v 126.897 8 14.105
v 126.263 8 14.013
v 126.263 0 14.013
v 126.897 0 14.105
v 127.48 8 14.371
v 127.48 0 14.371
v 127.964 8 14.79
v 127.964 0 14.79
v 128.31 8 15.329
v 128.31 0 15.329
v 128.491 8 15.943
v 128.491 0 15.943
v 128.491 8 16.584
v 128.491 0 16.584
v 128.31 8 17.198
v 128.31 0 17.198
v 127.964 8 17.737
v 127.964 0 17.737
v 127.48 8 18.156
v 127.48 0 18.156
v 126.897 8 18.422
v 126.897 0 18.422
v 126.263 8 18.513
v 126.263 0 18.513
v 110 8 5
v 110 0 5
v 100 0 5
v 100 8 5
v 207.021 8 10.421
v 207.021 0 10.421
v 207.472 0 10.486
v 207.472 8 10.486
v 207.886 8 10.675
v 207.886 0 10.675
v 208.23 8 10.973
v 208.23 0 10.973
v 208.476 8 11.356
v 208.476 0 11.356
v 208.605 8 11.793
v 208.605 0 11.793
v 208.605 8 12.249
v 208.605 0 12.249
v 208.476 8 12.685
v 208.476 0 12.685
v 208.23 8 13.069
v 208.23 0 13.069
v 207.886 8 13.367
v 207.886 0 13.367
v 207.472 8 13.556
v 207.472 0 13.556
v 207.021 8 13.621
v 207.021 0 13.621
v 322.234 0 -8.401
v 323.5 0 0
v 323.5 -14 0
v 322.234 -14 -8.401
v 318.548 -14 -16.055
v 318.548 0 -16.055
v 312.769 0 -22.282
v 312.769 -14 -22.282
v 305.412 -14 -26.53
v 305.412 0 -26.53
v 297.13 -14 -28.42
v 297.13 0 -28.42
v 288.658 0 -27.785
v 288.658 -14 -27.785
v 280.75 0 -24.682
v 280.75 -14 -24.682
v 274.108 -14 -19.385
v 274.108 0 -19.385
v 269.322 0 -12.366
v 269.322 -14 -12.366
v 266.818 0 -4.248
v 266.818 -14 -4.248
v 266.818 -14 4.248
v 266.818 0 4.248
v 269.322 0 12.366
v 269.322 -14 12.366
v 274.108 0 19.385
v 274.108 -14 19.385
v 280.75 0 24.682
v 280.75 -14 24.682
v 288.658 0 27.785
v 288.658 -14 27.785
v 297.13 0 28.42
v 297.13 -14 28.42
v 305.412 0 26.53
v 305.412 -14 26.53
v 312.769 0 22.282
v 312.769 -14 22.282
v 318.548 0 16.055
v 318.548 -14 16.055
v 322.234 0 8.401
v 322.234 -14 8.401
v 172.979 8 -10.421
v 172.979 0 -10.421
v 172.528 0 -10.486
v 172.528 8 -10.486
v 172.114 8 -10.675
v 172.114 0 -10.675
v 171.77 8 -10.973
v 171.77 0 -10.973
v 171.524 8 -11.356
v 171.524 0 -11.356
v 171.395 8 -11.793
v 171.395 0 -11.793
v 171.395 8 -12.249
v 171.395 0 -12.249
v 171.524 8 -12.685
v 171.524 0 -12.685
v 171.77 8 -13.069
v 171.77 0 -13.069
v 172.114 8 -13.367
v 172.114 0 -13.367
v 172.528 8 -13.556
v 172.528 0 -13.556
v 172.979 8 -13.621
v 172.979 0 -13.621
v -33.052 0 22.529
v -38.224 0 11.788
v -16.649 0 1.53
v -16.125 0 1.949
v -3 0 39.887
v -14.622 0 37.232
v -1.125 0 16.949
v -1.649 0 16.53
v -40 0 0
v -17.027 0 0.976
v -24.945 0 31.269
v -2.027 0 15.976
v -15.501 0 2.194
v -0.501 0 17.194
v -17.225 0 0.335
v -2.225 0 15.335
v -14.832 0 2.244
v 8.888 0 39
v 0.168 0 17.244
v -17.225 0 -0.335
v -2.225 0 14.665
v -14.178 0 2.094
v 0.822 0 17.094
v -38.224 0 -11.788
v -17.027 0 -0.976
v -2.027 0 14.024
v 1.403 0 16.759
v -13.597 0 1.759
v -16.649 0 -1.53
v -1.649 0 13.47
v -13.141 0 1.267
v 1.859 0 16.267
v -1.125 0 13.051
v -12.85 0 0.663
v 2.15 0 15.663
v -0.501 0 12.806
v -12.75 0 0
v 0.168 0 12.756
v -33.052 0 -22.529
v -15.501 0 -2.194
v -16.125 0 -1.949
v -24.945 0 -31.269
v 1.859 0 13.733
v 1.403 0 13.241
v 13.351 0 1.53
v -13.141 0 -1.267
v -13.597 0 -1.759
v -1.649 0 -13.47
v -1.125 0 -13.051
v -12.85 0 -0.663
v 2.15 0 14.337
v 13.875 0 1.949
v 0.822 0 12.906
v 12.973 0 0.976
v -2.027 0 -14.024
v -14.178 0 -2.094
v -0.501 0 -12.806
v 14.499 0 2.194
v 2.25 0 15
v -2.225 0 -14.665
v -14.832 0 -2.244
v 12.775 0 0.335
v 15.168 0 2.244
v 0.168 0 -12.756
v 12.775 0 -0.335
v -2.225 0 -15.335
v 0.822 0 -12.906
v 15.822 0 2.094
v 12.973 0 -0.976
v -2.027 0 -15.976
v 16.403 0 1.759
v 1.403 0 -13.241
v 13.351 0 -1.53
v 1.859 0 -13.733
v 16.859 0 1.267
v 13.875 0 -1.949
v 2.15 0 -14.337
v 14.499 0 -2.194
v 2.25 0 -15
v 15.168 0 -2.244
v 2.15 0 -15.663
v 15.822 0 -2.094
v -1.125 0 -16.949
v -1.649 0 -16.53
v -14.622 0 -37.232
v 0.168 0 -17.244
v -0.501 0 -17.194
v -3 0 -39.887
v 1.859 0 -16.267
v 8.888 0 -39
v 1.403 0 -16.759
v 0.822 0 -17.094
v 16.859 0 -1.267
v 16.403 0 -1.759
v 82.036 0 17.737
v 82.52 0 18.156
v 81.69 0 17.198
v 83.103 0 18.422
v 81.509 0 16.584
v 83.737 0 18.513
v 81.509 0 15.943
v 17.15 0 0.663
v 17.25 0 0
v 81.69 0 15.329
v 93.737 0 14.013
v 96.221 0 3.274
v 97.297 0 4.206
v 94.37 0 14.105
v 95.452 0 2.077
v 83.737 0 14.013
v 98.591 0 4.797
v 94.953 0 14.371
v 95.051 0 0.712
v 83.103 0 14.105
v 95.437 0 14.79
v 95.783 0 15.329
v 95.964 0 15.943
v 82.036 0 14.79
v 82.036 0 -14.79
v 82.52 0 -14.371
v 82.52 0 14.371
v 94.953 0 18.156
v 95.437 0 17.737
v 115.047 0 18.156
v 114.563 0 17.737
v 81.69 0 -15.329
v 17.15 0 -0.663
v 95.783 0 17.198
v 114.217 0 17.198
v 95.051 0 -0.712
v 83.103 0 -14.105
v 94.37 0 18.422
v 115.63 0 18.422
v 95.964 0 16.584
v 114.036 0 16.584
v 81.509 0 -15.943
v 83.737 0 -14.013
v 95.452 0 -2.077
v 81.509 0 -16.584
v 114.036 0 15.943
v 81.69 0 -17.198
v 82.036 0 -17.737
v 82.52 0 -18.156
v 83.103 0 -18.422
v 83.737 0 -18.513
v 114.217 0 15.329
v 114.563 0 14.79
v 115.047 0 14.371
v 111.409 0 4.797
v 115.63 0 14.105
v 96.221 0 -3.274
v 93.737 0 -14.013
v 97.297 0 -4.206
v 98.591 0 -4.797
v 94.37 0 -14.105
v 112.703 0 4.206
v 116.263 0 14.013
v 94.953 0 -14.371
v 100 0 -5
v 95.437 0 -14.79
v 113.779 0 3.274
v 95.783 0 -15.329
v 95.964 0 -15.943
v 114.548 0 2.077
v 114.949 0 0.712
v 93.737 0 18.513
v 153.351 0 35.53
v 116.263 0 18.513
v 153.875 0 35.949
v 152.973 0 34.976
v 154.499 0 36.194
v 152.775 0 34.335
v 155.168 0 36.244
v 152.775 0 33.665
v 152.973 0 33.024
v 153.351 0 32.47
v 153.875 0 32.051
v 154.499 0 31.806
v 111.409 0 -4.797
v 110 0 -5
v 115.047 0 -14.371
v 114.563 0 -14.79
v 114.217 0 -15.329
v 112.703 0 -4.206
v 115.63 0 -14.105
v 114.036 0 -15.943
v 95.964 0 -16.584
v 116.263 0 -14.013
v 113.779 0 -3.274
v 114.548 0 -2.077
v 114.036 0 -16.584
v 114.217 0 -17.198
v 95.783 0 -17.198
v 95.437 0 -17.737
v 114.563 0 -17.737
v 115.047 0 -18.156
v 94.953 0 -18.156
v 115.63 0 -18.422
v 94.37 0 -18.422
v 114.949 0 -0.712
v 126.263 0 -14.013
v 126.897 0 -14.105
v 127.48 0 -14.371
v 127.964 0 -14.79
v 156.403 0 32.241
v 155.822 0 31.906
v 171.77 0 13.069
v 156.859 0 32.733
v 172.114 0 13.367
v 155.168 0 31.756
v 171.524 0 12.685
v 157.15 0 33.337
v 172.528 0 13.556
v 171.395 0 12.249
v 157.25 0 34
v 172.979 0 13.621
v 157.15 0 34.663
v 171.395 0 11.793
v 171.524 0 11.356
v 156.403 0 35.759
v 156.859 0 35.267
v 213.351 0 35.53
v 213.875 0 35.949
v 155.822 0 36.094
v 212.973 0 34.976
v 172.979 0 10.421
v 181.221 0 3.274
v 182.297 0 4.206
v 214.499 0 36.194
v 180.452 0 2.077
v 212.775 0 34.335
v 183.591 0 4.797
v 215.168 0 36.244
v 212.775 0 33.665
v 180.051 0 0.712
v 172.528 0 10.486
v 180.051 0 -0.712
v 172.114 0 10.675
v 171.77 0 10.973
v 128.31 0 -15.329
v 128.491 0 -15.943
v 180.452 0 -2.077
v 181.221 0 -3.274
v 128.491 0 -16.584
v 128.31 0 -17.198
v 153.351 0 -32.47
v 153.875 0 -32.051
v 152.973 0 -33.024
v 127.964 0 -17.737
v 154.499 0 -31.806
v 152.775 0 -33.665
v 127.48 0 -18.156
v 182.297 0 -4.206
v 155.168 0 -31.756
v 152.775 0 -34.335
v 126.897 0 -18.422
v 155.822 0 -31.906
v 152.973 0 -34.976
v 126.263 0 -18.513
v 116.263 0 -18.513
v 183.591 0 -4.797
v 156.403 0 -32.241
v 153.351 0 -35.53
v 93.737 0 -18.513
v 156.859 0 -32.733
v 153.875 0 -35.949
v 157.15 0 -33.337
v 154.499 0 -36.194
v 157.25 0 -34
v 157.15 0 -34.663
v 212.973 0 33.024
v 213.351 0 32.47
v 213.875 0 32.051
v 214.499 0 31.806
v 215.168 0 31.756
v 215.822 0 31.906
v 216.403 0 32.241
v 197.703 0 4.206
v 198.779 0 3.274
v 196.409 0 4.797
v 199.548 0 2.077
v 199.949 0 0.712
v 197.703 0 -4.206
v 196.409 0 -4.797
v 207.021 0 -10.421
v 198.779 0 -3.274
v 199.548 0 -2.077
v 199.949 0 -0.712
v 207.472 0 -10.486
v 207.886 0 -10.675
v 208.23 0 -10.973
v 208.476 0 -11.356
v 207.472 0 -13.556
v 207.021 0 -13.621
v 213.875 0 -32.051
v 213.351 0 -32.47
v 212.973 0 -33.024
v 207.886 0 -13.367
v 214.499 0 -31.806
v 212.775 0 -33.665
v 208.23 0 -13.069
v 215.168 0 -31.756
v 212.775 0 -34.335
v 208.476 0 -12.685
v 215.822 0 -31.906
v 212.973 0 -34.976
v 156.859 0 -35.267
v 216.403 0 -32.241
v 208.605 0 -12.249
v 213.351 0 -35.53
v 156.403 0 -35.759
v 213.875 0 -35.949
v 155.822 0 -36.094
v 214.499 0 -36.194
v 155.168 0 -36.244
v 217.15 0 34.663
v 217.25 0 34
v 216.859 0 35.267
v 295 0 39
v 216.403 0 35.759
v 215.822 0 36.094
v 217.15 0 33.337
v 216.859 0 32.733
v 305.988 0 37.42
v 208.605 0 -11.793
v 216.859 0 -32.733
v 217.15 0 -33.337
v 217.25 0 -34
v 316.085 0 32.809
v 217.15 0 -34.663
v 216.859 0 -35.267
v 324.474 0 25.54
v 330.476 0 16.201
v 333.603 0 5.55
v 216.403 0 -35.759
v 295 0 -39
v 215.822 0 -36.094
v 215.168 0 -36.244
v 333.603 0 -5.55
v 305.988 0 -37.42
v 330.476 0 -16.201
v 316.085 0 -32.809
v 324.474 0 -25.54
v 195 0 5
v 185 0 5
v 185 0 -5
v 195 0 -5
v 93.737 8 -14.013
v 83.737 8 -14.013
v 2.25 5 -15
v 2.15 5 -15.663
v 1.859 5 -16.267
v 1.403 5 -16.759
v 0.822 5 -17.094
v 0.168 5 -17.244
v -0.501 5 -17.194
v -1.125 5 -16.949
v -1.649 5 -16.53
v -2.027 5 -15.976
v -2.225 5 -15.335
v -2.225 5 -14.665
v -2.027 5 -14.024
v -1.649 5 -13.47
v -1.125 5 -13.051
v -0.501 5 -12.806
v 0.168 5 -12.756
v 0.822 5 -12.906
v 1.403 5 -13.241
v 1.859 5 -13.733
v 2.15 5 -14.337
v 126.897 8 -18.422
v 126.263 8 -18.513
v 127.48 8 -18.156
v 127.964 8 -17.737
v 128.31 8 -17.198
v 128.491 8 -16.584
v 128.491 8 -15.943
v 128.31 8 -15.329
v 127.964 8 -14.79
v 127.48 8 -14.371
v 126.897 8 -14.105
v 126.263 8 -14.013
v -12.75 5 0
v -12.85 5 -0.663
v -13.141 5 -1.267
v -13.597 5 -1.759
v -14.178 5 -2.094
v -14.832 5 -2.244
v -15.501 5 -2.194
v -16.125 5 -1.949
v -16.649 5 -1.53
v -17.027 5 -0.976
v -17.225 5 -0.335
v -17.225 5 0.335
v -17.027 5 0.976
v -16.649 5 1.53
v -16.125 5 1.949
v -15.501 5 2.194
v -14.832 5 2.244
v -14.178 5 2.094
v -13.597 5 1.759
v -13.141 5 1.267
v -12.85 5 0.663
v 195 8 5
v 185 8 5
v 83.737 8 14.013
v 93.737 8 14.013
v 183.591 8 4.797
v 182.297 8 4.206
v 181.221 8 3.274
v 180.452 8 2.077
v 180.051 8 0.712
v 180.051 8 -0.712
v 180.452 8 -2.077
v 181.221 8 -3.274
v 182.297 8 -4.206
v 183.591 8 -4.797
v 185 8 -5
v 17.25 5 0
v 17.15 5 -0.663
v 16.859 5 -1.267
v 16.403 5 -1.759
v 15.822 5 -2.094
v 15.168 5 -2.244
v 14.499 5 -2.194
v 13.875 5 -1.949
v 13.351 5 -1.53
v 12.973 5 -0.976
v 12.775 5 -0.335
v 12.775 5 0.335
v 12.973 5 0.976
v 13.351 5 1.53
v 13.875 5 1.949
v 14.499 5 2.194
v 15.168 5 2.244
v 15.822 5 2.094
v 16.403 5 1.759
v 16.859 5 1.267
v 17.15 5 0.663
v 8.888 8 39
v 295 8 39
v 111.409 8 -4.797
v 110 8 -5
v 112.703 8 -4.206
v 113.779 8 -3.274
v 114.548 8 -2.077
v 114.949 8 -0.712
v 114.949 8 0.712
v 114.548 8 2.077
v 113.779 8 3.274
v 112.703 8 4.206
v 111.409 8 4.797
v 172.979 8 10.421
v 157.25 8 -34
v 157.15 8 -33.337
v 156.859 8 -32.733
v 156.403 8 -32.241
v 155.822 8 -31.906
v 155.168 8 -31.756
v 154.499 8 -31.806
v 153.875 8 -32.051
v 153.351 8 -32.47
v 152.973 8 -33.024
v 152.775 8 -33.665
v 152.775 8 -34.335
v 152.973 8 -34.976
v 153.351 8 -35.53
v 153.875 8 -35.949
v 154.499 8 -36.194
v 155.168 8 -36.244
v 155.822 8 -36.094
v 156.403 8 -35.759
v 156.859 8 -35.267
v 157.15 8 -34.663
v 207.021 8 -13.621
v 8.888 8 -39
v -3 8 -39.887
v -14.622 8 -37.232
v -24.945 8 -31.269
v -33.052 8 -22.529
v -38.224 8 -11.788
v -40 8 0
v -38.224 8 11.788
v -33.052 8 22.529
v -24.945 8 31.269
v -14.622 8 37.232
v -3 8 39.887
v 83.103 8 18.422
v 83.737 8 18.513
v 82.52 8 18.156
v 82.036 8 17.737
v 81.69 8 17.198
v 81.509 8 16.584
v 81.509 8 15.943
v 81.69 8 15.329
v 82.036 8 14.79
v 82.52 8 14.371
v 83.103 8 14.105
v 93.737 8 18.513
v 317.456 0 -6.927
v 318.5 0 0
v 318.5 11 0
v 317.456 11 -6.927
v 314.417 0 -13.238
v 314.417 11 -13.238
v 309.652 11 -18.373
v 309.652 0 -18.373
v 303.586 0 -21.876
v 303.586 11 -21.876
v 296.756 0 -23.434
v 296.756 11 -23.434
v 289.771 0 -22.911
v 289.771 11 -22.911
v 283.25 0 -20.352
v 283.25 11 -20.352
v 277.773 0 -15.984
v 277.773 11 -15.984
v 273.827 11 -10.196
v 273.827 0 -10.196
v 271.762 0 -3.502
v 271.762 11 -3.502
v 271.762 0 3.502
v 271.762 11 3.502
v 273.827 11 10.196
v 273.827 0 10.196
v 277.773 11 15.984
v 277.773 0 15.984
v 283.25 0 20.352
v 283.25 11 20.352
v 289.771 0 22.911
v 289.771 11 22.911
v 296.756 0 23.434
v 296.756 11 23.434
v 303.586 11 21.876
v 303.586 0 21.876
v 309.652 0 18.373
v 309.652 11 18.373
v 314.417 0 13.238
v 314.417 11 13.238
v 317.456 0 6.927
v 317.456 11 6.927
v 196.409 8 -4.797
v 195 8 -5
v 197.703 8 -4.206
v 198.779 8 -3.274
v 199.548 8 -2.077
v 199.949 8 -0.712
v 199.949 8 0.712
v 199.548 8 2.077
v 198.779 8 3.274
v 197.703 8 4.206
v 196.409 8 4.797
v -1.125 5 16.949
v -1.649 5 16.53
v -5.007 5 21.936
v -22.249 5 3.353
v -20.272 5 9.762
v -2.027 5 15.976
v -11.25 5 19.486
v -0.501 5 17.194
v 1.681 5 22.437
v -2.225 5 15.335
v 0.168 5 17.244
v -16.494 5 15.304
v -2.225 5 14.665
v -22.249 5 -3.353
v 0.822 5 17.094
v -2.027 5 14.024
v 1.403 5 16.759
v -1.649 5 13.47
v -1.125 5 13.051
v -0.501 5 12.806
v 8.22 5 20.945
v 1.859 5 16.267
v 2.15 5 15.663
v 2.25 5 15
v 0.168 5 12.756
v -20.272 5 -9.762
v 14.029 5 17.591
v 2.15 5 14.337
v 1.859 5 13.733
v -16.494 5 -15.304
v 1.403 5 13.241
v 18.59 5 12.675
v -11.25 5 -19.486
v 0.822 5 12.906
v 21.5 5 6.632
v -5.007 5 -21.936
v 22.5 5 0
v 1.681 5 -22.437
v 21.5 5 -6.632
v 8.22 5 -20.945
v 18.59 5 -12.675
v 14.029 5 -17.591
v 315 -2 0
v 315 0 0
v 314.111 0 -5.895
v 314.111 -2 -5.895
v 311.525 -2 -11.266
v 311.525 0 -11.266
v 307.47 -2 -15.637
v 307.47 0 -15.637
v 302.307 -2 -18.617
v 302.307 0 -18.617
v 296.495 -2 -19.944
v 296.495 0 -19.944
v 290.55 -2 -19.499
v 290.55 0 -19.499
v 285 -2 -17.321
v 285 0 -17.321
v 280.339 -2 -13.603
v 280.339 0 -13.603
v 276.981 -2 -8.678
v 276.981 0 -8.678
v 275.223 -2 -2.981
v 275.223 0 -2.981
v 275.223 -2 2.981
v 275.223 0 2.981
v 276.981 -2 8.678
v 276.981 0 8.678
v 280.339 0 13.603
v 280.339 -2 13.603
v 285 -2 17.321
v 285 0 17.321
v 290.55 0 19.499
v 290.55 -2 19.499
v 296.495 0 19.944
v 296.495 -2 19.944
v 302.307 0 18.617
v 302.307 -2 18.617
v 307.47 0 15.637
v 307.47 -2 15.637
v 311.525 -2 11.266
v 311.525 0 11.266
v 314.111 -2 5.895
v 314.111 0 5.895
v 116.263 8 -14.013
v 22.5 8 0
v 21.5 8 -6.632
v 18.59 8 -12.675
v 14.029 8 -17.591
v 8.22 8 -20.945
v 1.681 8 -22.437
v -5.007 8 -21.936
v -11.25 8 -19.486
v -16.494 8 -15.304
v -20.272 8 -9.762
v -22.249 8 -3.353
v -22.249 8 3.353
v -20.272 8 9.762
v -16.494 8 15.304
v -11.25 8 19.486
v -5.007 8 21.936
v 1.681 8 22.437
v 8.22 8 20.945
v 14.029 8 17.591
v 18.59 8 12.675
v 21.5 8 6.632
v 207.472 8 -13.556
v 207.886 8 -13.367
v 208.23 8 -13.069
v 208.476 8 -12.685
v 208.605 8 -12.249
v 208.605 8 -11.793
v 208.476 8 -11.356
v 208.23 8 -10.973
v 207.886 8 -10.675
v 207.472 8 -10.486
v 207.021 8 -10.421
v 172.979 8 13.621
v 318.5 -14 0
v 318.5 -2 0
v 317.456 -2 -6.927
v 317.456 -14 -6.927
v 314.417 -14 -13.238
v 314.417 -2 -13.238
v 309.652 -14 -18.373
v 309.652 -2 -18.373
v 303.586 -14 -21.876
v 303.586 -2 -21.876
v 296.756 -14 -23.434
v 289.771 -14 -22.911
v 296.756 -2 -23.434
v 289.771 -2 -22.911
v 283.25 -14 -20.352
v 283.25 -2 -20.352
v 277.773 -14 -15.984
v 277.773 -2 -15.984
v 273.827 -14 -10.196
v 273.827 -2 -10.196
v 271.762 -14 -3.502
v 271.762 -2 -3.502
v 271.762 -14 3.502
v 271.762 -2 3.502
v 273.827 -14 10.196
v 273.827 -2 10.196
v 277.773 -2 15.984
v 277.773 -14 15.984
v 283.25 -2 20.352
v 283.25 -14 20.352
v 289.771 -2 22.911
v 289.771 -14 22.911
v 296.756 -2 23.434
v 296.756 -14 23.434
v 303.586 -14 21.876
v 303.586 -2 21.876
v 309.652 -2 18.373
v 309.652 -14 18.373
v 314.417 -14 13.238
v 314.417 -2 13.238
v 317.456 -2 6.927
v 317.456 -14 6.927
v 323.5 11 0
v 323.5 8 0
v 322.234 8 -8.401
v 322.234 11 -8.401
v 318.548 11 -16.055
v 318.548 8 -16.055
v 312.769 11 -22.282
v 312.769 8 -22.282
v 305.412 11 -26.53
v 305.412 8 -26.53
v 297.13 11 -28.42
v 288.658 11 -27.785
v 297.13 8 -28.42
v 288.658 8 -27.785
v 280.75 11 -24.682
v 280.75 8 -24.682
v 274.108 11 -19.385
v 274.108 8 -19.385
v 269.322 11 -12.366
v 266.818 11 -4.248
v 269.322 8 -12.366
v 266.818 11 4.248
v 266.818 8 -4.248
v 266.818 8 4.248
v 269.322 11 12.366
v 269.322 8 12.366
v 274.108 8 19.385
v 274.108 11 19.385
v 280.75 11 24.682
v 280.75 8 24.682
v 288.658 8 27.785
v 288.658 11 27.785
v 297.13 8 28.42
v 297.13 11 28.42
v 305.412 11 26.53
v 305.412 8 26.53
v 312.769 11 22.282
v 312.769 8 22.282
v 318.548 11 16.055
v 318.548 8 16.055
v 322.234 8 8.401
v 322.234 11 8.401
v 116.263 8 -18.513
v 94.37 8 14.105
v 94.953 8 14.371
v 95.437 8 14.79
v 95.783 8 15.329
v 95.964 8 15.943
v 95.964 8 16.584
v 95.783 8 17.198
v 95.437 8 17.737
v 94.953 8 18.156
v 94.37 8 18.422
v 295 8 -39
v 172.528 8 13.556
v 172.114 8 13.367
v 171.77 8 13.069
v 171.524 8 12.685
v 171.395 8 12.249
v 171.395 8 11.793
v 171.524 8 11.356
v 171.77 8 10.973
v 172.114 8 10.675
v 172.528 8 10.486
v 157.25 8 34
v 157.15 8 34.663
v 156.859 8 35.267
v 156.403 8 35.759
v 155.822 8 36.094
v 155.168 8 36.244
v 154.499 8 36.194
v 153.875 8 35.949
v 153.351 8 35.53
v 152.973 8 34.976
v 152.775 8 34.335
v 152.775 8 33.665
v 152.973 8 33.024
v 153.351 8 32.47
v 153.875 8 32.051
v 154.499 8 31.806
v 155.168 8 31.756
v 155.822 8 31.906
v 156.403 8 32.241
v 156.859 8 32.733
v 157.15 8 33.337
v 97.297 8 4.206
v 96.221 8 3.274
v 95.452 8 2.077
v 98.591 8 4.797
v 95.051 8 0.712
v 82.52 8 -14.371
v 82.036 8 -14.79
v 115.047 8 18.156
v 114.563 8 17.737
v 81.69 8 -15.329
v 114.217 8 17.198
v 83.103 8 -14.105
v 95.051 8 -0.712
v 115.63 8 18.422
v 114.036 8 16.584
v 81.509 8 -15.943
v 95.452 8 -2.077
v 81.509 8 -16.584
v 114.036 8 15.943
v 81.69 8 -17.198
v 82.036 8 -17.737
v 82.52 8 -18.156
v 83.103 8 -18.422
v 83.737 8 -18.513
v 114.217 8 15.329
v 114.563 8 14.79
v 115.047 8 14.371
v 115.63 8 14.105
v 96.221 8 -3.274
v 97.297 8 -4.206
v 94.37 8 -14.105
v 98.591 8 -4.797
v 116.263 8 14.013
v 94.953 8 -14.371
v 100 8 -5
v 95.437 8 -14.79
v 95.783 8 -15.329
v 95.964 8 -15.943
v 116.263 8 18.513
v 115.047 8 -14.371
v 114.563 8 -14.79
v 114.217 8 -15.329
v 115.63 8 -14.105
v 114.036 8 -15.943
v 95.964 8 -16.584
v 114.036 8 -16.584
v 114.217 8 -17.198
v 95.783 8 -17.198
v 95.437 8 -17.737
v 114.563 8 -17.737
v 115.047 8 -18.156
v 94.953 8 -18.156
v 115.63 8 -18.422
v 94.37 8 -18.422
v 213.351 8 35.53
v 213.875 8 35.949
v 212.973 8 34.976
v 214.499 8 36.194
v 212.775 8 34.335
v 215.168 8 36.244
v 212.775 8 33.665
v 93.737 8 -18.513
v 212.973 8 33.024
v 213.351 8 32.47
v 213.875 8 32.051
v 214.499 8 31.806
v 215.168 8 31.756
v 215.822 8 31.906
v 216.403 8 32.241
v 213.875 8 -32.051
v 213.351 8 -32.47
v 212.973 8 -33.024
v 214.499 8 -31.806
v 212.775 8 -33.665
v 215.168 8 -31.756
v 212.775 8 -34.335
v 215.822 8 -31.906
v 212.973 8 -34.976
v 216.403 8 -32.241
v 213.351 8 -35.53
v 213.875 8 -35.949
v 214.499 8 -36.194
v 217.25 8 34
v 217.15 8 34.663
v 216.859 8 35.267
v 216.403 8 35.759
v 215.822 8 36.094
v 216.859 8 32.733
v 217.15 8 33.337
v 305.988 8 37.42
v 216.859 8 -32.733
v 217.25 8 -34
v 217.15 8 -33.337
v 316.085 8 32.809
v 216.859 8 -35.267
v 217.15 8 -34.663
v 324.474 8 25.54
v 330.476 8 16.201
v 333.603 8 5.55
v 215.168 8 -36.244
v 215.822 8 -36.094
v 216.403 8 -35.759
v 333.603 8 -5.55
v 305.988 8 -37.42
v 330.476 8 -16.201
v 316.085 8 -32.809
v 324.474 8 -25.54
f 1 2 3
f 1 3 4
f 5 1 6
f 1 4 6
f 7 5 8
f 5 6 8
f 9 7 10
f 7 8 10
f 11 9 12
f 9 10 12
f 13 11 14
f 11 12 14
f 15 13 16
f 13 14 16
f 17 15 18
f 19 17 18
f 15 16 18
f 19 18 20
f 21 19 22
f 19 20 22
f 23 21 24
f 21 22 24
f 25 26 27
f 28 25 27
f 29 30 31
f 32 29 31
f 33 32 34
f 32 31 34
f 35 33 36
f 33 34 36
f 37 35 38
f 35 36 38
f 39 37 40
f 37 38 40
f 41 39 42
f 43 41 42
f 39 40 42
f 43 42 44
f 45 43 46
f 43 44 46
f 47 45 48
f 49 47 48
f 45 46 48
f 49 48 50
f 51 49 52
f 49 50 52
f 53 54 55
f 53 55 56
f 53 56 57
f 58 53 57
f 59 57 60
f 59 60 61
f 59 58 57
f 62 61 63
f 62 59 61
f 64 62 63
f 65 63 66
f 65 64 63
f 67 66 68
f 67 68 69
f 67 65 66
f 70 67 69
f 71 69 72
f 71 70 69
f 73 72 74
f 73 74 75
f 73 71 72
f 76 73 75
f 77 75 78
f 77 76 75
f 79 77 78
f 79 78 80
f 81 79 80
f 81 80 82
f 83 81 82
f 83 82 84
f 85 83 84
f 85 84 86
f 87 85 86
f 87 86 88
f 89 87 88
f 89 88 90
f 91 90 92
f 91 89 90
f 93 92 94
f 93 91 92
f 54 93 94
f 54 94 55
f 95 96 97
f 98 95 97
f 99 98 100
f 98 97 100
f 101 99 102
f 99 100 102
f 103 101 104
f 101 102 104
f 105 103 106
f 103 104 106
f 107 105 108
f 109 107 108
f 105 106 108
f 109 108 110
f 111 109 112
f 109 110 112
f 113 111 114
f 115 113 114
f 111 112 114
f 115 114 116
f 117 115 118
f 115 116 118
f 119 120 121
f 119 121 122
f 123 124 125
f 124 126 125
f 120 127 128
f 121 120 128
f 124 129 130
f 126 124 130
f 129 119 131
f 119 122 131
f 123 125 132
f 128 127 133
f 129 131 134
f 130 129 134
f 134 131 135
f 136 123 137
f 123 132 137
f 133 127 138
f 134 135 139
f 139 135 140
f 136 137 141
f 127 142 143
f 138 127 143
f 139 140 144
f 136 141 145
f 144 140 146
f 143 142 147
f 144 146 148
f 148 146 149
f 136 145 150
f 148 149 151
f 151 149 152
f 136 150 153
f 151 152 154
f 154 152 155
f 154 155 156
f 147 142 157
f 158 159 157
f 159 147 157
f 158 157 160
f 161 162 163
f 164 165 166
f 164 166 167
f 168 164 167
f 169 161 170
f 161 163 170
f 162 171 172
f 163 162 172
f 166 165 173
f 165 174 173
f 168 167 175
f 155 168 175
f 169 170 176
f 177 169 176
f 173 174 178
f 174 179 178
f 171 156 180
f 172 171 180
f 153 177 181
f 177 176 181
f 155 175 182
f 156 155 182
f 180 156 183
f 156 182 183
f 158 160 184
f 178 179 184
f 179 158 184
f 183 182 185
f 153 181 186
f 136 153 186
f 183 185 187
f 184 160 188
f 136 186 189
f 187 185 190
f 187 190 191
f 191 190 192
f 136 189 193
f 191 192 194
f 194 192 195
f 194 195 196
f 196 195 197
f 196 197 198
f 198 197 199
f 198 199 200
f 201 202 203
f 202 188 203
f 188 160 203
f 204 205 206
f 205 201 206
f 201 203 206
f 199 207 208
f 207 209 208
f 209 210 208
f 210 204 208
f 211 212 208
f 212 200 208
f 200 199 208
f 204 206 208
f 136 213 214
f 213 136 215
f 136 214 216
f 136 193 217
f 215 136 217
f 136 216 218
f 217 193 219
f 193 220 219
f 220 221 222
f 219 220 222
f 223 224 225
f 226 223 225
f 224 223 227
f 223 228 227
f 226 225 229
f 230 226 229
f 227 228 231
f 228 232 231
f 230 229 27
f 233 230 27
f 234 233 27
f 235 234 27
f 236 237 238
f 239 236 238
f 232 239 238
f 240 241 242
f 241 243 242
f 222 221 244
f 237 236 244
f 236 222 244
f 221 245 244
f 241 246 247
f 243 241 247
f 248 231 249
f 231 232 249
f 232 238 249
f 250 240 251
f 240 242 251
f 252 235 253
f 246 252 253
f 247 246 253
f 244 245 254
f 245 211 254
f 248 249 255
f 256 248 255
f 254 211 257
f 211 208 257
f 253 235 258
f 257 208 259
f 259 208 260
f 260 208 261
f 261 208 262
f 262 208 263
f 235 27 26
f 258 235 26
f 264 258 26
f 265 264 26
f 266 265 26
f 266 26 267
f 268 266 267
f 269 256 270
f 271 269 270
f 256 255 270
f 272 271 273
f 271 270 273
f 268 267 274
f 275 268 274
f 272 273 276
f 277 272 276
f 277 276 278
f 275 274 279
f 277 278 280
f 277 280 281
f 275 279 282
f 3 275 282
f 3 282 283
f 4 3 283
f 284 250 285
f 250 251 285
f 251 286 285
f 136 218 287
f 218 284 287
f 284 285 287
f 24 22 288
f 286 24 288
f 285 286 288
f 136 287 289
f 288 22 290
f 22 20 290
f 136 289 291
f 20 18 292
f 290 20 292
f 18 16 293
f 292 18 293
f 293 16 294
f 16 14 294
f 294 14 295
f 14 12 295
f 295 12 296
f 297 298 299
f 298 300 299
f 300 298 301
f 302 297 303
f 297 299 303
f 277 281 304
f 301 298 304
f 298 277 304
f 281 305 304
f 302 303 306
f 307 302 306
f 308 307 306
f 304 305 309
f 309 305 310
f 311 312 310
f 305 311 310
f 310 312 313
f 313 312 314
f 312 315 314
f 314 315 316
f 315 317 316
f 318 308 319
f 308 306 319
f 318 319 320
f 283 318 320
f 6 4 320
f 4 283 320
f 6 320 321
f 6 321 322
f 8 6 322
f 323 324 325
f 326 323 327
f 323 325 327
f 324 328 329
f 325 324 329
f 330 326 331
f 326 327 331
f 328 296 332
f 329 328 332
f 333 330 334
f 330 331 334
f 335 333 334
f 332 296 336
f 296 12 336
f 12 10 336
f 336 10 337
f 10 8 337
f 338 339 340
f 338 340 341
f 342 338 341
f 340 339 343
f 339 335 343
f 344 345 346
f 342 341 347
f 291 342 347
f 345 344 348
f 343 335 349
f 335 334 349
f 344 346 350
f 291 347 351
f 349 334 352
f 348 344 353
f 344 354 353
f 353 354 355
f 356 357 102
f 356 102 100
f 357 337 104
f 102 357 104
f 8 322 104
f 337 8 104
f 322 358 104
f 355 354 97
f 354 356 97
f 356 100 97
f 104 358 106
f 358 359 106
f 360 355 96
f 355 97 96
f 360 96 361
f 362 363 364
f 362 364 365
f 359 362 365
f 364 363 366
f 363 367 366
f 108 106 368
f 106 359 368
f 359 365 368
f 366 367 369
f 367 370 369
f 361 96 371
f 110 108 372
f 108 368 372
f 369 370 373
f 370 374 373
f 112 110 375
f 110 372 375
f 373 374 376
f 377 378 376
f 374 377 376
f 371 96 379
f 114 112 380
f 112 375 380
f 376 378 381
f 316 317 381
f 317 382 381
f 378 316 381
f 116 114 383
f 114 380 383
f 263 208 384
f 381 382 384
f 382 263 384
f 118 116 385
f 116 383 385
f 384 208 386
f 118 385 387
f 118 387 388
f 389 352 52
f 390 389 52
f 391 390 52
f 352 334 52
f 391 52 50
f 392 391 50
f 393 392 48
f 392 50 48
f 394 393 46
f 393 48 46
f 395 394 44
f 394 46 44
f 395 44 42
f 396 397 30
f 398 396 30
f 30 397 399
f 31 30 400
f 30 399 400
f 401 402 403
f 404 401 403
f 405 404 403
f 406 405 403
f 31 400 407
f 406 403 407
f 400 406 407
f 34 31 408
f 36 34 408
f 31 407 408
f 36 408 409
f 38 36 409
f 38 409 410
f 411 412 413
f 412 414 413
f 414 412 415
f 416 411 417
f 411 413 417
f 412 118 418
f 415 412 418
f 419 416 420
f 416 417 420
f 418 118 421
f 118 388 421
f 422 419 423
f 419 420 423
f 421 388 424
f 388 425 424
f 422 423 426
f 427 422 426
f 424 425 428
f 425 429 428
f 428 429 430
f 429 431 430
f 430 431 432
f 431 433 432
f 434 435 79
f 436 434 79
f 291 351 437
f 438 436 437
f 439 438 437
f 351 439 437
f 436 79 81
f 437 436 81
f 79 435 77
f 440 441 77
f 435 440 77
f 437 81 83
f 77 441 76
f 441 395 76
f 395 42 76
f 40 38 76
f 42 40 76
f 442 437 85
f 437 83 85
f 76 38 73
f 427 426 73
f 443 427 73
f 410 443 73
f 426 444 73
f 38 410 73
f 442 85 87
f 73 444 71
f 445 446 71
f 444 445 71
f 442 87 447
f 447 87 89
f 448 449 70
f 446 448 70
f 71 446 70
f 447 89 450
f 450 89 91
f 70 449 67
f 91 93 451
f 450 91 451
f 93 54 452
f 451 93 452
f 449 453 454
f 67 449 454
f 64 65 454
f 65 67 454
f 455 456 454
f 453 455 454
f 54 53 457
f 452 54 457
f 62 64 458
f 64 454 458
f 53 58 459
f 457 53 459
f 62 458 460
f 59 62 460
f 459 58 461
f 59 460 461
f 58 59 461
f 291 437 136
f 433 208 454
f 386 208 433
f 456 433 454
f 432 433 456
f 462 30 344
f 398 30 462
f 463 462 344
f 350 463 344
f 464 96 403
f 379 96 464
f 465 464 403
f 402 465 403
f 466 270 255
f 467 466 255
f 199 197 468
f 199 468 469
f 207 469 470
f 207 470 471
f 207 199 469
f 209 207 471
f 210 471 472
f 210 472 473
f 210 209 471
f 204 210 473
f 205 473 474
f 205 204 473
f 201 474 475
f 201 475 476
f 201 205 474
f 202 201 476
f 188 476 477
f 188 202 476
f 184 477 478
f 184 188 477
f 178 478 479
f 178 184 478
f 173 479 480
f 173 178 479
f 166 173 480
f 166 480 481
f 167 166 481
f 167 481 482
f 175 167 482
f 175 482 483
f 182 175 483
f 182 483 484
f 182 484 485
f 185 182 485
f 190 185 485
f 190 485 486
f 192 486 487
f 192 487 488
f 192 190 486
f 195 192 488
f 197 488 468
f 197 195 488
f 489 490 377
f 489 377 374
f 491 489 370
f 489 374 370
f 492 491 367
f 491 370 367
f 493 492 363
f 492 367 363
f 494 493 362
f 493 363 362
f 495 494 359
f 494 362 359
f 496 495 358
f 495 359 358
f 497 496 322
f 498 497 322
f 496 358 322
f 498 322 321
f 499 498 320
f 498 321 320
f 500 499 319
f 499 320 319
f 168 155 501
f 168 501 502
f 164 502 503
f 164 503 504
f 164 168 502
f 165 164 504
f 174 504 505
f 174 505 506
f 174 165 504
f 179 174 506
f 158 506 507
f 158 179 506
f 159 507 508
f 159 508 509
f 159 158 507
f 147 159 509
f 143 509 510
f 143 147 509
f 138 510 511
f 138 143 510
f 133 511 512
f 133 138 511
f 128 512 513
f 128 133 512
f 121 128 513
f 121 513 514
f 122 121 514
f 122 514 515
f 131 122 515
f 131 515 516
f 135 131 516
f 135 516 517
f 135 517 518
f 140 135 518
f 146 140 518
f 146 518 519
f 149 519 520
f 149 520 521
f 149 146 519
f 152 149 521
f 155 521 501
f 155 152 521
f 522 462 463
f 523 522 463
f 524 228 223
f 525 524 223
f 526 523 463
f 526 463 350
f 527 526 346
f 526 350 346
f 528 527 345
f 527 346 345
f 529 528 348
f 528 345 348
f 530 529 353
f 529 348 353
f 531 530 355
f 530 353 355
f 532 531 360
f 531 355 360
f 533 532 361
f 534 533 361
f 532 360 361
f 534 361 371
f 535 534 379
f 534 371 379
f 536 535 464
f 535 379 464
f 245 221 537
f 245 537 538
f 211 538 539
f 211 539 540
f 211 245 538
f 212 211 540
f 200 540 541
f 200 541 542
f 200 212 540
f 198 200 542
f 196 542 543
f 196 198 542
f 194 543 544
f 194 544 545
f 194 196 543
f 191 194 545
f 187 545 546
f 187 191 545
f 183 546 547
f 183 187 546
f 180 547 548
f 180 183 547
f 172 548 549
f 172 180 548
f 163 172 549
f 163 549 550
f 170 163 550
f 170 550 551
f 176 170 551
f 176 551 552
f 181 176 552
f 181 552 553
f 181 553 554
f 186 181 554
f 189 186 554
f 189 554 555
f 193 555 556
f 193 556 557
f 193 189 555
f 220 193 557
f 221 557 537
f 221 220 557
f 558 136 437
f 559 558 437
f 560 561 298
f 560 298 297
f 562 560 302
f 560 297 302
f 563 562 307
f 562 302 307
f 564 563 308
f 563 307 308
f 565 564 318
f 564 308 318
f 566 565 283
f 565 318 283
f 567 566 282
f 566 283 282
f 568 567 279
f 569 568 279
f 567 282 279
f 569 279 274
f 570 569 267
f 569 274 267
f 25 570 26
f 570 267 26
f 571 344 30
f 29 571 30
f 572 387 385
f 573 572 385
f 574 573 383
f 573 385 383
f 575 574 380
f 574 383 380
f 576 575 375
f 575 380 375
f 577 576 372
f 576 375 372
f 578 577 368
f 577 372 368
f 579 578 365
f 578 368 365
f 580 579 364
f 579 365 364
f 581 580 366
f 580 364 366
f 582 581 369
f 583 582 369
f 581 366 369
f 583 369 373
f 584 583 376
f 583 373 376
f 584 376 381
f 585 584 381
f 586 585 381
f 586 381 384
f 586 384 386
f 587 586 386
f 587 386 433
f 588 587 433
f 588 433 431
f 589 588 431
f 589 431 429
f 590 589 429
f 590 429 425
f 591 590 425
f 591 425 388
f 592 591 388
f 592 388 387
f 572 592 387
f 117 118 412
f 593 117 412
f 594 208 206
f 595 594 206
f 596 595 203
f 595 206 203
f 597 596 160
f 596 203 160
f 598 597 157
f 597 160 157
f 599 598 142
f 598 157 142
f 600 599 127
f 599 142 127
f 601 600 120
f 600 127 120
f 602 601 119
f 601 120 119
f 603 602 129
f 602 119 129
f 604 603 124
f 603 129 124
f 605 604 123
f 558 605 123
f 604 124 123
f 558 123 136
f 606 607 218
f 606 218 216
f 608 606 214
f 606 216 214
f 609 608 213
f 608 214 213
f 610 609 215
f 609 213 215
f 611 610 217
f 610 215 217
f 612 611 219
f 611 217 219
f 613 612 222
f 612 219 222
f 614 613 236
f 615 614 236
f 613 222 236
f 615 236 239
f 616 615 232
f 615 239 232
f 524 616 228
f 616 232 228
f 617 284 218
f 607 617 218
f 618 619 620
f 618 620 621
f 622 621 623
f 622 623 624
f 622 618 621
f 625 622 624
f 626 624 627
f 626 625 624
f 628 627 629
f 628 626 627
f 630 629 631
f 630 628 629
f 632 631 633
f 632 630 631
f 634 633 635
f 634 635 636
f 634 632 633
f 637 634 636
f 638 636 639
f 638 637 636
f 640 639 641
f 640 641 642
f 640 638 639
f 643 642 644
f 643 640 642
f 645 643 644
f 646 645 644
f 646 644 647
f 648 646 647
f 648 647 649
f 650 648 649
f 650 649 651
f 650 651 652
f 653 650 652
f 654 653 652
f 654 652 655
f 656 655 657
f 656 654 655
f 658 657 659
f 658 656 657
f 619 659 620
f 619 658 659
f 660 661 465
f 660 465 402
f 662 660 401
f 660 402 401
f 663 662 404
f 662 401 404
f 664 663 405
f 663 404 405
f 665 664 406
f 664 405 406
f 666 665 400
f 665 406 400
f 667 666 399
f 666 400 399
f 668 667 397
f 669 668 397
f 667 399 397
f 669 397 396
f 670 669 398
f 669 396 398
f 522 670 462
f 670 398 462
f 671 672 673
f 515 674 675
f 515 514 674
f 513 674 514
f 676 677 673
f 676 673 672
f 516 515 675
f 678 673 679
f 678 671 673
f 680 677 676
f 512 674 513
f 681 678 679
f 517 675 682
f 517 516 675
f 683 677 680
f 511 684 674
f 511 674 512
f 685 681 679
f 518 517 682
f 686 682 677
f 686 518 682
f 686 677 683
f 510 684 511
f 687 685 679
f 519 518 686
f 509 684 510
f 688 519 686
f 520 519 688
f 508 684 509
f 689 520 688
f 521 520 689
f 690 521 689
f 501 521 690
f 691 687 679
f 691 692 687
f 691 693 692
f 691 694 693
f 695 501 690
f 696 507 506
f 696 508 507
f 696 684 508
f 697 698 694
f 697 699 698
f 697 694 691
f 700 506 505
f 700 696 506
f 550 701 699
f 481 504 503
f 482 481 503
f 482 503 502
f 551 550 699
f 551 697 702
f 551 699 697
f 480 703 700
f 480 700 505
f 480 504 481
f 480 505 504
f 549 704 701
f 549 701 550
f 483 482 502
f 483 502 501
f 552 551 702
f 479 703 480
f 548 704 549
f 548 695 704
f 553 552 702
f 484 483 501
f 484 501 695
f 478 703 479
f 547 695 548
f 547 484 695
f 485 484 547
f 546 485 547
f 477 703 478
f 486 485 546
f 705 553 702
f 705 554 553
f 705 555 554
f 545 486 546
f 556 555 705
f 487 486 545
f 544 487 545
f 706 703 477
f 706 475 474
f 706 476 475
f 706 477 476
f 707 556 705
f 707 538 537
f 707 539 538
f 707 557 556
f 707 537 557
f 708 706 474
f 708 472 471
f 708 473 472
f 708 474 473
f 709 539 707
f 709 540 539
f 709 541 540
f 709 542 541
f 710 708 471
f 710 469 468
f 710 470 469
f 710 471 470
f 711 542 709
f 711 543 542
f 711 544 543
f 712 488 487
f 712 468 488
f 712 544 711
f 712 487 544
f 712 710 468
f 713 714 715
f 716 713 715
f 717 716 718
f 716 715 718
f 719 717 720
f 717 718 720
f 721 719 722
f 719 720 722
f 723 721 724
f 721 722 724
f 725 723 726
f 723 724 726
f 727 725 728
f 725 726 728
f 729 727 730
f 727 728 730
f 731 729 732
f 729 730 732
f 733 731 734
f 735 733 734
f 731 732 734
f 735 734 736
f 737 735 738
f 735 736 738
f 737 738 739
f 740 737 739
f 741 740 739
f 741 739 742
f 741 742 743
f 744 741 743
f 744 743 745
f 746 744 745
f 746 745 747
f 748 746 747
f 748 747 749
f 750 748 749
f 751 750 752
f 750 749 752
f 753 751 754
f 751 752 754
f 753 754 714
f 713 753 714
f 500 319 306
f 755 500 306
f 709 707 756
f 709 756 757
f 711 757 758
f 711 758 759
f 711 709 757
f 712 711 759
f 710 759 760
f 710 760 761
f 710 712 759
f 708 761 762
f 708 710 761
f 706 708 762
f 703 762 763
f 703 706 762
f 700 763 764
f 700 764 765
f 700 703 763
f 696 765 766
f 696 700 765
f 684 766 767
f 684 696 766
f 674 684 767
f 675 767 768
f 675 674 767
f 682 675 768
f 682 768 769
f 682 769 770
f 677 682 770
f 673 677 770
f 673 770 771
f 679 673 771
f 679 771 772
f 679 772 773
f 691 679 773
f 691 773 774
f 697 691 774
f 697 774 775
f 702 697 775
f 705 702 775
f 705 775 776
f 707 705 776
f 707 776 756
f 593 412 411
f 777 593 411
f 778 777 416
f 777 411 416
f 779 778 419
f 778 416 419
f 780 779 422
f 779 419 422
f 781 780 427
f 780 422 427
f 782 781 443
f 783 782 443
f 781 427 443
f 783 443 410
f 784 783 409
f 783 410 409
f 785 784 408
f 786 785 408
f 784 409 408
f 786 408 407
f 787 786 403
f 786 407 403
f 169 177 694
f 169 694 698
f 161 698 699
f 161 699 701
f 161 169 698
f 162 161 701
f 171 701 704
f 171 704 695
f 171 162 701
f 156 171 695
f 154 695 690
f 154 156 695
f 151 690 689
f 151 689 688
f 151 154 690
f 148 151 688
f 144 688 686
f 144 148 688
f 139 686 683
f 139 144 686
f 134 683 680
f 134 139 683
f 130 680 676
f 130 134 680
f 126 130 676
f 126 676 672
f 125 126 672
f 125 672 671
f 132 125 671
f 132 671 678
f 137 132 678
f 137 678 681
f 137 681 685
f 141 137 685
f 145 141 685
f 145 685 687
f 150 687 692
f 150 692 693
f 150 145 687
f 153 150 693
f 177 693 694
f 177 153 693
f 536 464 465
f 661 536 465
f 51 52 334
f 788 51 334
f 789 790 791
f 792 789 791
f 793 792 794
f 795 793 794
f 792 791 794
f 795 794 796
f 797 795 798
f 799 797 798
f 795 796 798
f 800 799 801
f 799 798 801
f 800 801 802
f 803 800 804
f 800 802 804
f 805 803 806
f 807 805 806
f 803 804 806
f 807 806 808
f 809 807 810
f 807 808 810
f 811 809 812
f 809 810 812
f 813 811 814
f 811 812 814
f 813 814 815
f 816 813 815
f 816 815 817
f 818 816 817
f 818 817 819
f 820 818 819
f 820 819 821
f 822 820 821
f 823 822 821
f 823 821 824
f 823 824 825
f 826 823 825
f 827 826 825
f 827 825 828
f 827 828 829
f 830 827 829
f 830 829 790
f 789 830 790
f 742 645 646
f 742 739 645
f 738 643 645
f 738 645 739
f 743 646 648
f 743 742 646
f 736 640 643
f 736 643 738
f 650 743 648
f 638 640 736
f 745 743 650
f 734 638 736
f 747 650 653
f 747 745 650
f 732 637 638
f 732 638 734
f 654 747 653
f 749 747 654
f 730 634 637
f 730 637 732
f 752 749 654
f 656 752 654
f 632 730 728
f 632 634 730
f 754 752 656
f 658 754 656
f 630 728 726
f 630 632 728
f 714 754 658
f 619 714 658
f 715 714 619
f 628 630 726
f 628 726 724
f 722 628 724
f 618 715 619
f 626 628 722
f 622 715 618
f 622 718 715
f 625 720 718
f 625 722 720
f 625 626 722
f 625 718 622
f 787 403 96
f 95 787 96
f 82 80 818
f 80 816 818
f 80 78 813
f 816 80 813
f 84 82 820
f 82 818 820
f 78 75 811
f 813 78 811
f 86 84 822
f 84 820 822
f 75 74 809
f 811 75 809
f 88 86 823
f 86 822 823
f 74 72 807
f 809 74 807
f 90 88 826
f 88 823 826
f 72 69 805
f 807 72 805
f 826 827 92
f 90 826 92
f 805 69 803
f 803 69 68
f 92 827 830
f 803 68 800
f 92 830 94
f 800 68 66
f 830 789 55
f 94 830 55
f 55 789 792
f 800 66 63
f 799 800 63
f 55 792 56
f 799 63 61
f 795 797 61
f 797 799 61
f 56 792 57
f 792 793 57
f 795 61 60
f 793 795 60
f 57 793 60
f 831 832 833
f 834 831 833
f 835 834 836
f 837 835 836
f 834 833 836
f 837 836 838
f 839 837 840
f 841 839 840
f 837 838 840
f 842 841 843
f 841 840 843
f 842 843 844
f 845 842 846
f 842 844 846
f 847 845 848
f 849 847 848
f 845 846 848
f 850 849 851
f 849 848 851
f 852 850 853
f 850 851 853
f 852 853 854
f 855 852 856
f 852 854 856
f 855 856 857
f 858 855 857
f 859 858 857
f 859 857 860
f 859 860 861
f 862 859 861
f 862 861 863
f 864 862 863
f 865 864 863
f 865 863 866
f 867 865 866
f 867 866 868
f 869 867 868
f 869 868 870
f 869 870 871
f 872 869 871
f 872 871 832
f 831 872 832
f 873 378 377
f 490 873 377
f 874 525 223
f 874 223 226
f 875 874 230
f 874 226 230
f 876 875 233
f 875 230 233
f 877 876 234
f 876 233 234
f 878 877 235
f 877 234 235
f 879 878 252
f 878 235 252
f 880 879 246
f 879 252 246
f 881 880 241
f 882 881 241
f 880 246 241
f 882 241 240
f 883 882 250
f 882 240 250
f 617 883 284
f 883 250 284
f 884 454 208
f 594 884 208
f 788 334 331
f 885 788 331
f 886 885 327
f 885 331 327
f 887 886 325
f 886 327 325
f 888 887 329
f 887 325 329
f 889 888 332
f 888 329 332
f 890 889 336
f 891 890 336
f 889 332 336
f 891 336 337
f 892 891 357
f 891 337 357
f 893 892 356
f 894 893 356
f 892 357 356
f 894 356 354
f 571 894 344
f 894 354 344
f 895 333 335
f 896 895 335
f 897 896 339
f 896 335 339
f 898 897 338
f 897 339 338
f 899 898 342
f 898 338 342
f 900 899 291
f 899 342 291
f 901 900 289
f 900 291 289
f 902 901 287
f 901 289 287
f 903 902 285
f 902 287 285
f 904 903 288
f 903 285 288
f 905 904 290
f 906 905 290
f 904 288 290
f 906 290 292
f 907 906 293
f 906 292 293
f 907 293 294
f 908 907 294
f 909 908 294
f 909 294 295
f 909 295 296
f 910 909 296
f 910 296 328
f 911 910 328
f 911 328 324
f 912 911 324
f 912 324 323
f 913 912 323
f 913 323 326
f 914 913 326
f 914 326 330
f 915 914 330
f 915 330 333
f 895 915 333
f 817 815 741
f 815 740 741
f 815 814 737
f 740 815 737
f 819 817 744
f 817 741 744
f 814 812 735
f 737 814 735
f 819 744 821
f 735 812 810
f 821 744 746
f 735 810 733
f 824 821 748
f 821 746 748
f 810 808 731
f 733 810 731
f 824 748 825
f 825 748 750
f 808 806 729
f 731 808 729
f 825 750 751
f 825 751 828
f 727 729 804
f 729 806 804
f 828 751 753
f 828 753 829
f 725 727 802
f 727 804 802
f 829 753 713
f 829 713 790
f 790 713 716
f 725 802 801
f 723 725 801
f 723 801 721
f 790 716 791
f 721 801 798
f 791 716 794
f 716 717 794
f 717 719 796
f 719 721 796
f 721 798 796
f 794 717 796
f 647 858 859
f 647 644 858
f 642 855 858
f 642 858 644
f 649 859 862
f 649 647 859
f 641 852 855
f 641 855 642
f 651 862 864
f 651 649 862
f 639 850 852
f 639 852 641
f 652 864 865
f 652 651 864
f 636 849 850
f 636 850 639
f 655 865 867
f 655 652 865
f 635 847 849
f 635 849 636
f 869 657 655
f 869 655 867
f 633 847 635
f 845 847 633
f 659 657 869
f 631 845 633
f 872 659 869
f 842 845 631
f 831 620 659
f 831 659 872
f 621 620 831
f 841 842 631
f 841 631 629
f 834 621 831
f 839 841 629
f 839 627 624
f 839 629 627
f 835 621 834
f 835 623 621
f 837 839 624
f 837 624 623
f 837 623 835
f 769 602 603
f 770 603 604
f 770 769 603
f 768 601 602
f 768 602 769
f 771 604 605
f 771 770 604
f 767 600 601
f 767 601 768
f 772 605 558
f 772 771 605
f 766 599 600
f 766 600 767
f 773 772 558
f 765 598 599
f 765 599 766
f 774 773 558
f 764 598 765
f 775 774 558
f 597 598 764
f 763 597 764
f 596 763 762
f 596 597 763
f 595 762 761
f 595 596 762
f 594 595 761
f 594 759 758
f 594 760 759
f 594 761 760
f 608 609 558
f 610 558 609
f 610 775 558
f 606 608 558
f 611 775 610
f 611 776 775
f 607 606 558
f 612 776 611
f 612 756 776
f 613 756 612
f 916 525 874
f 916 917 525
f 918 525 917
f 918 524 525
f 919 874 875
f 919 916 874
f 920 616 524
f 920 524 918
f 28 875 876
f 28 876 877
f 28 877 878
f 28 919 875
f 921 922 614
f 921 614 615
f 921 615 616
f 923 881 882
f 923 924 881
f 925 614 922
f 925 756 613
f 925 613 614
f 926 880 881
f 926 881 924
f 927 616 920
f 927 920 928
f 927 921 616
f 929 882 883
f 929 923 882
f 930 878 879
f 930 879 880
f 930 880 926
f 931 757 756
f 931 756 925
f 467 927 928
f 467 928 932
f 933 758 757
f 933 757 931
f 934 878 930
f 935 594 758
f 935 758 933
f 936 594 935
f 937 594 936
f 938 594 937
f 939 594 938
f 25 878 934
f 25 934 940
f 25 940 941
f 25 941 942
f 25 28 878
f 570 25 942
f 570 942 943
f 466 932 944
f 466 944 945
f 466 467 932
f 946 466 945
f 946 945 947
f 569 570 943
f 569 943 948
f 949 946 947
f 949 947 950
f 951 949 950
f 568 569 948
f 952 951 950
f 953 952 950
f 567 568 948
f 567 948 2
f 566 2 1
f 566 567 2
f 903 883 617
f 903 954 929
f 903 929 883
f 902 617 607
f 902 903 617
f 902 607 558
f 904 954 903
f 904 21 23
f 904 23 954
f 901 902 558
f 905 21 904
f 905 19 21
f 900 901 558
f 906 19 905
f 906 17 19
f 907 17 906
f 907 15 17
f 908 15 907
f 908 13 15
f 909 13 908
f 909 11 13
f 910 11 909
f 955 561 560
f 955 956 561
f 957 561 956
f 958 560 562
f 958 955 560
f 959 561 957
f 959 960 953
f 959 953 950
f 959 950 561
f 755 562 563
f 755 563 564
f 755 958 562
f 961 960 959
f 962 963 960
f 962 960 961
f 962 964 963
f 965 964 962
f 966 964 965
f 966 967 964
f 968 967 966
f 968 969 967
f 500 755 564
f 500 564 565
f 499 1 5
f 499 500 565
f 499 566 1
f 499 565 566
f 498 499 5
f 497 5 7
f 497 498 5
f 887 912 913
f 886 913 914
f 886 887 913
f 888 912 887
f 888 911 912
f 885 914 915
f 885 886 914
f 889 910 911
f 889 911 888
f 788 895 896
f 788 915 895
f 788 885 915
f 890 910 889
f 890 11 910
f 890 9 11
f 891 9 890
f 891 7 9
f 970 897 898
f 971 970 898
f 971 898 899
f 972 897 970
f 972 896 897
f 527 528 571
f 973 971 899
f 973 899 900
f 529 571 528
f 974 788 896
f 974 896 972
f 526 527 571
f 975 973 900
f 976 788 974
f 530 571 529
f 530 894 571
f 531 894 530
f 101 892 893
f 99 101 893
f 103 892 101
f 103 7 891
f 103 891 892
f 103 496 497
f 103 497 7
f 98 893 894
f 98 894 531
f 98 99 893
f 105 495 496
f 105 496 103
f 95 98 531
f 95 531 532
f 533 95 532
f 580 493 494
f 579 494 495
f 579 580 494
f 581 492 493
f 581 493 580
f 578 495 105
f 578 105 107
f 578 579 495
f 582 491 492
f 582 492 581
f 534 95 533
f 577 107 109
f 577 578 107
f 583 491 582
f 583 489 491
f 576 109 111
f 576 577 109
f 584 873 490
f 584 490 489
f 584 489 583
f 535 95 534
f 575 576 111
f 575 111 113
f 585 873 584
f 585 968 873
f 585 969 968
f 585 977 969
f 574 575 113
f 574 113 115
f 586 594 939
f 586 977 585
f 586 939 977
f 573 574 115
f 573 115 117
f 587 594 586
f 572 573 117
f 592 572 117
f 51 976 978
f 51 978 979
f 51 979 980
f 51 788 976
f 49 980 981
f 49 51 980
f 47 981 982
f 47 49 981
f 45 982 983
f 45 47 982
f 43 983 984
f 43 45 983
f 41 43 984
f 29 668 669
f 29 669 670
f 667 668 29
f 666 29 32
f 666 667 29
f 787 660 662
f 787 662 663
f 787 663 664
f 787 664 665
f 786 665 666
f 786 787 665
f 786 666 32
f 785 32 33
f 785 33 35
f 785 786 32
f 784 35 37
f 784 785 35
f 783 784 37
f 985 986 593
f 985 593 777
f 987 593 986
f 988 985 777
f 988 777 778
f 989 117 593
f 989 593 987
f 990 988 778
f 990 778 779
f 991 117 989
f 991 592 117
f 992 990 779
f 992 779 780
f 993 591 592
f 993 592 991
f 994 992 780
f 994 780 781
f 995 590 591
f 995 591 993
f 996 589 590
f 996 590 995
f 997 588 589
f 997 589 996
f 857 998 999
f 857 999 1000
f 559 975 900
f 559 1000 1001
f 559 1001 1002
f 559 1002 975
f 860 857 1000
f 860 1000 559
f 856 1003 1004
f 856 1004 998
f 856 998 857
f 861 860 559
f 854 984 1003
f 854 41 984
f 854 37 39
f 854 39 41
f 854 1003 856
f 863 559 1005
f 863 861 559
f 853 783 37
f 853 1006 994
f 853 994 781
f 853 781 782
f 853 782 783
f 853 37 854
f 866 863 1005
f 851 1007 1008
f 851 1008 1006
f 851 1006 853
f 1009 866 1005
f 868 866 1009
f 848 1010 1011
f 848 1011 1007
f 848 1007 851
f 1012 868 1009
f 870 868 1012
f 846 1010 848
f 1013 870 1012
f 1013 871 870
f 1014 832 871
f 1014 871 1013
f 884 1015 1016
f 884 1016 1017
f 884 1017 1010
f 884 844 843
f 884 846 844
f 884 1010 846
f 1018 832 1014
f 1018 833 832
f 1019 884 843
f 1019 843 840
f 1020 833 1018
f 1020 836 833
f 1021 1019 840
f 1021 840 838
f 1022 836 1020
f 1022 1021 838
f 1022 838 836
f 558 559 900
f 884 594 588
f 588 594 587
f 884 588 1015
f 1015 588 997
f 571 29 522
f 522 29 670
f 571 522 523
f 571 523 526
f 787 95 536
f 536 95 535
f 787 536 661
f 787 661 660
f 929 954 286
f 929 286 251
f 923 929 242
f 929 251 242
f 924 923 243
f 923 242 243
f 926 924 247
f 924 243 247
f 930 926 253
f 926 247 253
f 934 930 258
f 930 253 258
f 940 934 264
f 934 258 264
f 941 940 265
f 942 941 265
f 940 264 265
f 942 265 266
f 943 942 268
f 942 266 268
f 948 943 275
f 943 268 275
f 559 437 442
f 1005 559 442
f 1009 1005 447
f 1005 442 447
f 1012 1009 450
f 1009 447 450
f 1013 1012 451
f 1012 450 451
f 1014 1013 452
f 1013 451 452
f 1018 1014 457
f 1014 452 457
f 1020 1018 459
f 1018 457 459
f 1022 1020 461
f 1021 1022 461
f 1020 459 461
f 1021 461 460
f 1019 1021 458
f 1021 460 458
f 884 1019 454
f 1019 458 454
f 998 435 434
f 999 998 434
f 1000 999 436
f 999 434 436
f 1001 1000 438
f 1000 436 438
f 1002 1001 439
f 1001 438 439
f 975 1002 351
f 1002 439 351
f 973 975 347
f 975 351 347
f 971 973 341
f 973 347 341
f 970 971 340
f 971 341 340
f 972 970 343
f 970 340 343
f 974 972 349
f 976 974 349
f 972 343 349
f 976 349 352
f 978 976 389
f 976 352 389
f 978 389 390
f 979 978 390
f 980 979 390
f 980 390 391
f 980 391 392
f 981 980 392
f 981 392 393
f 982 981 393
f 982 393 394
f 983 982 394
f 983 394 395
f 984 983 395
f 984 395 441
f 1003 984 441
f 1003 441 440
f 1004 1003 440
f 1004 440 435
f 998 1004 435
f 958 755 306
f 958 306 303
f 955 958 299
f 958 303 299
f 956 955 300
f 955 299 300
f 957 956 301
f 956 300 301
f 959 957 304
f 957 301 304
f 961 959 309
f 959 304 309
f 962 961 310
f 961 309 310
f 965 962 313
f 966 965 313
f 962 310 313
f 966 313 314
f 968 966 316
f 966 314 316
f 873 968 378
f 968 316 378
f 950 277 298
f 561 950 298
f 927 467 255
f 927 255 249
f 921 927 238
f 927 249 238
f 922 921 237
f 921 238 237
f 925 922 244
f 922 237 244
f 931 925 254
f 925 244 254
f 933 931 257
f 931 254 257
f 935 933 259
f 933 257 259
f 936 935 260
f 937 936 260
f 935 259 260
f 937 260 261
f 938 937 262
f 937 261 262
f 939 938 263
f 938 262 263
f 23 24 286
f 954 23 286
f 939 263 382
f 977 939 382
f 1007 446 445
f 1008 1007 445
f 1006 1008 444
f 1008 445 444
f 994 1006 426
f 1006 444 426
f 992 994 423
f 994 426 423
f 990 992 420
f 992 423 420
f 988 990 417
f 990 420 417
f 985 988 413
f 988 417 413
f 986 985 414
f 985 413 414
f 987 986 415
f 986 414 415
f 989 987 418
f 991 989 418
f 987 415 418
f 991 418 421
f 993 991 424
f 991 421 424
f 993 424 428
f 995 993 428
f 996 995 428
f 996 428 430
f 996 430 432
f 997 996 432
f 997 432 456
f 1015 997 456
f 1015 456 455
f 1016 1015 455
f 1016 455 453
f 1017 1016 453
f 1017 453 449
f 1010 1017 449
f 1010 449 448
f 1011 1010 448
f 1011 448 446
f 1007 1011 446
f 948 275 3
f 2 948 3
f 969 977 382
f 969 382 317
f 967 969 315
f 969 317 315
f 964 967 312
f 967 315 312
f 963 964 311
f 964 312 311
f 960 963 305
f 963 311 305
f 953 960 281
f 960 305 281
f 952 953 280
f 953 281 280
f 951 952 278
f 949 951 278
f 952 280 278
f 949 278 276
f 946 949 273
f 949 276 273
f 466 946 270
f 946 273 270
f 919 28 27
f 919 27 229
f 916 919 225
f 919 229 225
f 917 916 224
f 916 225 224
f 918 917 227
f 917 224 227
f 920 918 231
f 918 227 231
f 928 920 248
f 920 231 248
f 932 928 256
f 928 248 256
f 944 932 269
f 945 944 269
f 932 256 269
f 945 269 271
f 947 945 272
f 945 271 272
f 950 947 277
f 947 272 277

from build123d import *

# Parameters (mm, degrees)
SKETCH4_R                = 22.5
SKETCH4_R_2              = 2.25
BOSS_EXTRUDE3_DEPTH      = 5
SKETCH4_4_R              = 28.5
SKETCH4_4_R_2            = 22.5
BOSS_EXTRUDE4_DEPTH      = 8
BOSS_EXTRUDE5_DEPTH      = 11
BOSS_EXTRUDE5_DEPTH_BACK = 14
SKETCH4_5_R              = 28.5
SKETCH4_5_R_2            = 23.5
SKETCH4_6_R              = 23.5
SKETCH4_6_R_2            = 20
BOSS_EXTRUDE6_DEPTH      = 2
SKETCH5_R                = 2.25
CUT_EXTRUDE1_DEPTH       = 10


with BuildPart() as part:
    # Sketch4 → Boss-Extrude3 (new body)
    with BuildSketch(Plane(origin=(0, 0, 0), x_dir=(1, 0, 0), z_dir=(0, 1, 0))):
        Circle(SKETCH4_R)
        with Locations((0, -15)):
            Circle(SKETCH4_R_2, mode=Mode.SUBTRACT)
        with Locations((15, 0)):
            Circle(SKETCH4_R_2, mode=Mode.SUBTRACT)
        with Locations((-15, 0)):
            Circle(SKETCH4_R_2, mode=Mode.SUBTRACT)
        with Locations((0, 15)):
            Circle(SKETCH4_R_2, mode=Mode.SUBTRACT)
    extrude(amount=BOSS_EXTRUDE3_DEPTH)

    # Sketch4<4> → Boss-Extrude4 (add)
    with BuildSketch(Plane(origin=(0, 0, 0), x_dir=(1, 0, 0), z_dir=(0, 1, 0))):
        with BuildLine():
            ThreePointArc((8.888194417, 39), (-40, 0), (8.888194417, -39))
            Line((8.888194417, -39), (295, -39))
            ThreePointArc((295, -39), (334, 0), (295, 39))
            Line((295, 39), (8.888194417, 39))
        make_face()
        with BuildLine():
            Line((93.736544033, -18.513455967), (83.736544033, -18.513455967))
            ThreePointArc((83.736544033, -18.513455967), (81.486544033, -16.263455967), (83.736544033, -14.013455967))
            Line((83.736544033, -14.013455967), (93.736544033, -14.013455967))
            ThreePointArc((93.736544033, -14.013455967), (95.986544033, -16.263455967), (93.736544033, -18.513455967))
        make_face(mode=Mode.SUBTRACT)
        with BuildLine():
            Line((126.263455967, -18.513455967), (116.263455967, -18.513455967))
            ThreePointArc((116.263455967, -18.513455967), (114.013455967, -16.263455967), (116.263455967, -14.013455967))
            Line((116.263455967, -14.013455967), (126.263455967, -14.013455967))
            ThreePointArc((126.263455967, -14.013455967), (128.513455967, -16.263455967), (126.263455967, -18.513455967))
        make_face(mode=Mode.SUBTRACT)
        with BuildLine():
            Line((172.97918472, -10.42081528), (207.02081528, -10.42081528))
            ThreePointArc((207.02081528, -10.42081528), (208.62081528, -12.02081528), (207.02081528, -13.62081528))
            Line((207.02081528, -13.62081528), (172.97918472, -13.62081528))
            ThreePointArc((172.97918472, -13.62081528), (171.37918472, -12.02081528), (172.97918472, -10.42081528))
        make_face(mode=Mode.SUBTRACT)
        with BuildLine():
            ThreePointArc((100, -5), (95, 0), (100, 5))
            Line((100, 5), (110, 5))
            ThreePointArc((110, 5), (115, 0), (110, -5))
            Line((110, -5), (100, -5))
        make_face(mode=Mode.SUBTRACT)
        with BuildLine():
            ThreePointArc((83.736544033, 14.013455967), (81.486544033, 16.263455967), (83.736544033, 18.513455967))
            Line((83.736544033, 18.513455967), (93.736544033, 18.513455967))
            ThreePointArc((93.736544033, 18.513455967), (95.986544033, 16.263455967), (93.736544033, 14.013455967))
            Line((93.736544033, 14.013455967), (83.736544033, 14.013455967))
        make_face(mode=Mode.SUBTRACT)
        with BuildLine():
            ThreePointArc((116.263455967, 14.013455967), (114.013455967, 16.263455967), (116.263455967, 18.513455967))
            Line((116.263455967, 18.513455967), (126.263455967, 18.513455967))
            ThreePointArc((126.263455967, 18.513455967), (128.513455967, 16.263455967), (126.263455967, 14.013455967))
            Line((126.263455967, 14.013455967), (116.263455967, 14.013455967))
        make_face(mode=Mode.SUBTRACT)
        with BuildLine():
            ThreePointArc((195, 5), (200, 0), (195, -5))
            Line((195, -5), (185, -5))
            ThreePointArc((185, -5), (180, 0), (185, 5))
            Line((185, 5), (195, 5))
        make_face(mode=Mode.SUBTRACT)
        with BuildLine():
            ThreePointArc((207.02081528, 13.62081528), (208.62081528, 12.02081528), (207.02081528, 10.42081528))
            Line((207.02081528, 10.42081528), (172.97918472, 10.42081528))
            ThreePointArc((172.97918472, 10.42081528), (171.37918472, 12.02081528), (172.97918472, 13.62081528))
            Line((172.97918472, 13.62081528), (207.02081528, 13.62081528))
        make_face(mode=Mode.SUBTRACT)
        with Locations((295, 0)):
            Circle(SKETCH4_4_R, mode=Mode.SUBTRACT)
        Circle(SKETCH4_4_R_2, mode=Mode.SUBTRACT)
    extrude(amount=BOSS_EXTRUDE4_DEPTH)

    # Sketch4<5> → Boss-Extrude5 (add, two sides: drawn at the far end of the back side and taken through both)
    with BuildSketch(Plane(origin=(0, 0, 0), x_dir=(1, 0, 0), z_dir=(0, 1, 0)).offset(-BOSS_EXTRUDE5_DEPTH_BACK)):
        with Locations((295, 0)):
            Circle(SKETCH4_5_R)
        with Locations((295, 0)):
            Circle(SKETCH4_5_R_2, mode=Mode.SUBTRACT)
    extrude(amount=BOSS_EXTRUDE5_DEPTH + BOSS_EXTRUDE5_DEPTH_BACK)

    # Sketch4<6> → Boss-Extrude6 (add)
    with BuildSketch(Plane(origin=(0, 0, 0), x_dir=(1, 0, 0), z_dir=(0, 1, 0))):
        with Locations((295, 0)):
            Circle(SKETCH4_6_R)
        with Locations((295, 0)):
            Circle(SKETCH4_6_R_2, mode=Mode.SUBTRACT)
    extrude(amount=-BOSS_EXTRUDE6_DEPTH)

    # Sketch5 → Cut-Extrude1 (cut)
    with BuildSketch(Plane.XZ):
        with Locations((155, 34)):
            Circle(SKETCH5_R)
        with Locations((215, 34)):
            Circle(SKETCH5_R)
        with Locations((215, -34)):
            Circle(SKETCH5_R)
        with Locations((155, -34)):
            Circle(SKETCH5_R)
    extrude(amount=-CUT_EXTRUDE1_DEPTH, mode=Mode.SUBTRACT)


solid = part.part
